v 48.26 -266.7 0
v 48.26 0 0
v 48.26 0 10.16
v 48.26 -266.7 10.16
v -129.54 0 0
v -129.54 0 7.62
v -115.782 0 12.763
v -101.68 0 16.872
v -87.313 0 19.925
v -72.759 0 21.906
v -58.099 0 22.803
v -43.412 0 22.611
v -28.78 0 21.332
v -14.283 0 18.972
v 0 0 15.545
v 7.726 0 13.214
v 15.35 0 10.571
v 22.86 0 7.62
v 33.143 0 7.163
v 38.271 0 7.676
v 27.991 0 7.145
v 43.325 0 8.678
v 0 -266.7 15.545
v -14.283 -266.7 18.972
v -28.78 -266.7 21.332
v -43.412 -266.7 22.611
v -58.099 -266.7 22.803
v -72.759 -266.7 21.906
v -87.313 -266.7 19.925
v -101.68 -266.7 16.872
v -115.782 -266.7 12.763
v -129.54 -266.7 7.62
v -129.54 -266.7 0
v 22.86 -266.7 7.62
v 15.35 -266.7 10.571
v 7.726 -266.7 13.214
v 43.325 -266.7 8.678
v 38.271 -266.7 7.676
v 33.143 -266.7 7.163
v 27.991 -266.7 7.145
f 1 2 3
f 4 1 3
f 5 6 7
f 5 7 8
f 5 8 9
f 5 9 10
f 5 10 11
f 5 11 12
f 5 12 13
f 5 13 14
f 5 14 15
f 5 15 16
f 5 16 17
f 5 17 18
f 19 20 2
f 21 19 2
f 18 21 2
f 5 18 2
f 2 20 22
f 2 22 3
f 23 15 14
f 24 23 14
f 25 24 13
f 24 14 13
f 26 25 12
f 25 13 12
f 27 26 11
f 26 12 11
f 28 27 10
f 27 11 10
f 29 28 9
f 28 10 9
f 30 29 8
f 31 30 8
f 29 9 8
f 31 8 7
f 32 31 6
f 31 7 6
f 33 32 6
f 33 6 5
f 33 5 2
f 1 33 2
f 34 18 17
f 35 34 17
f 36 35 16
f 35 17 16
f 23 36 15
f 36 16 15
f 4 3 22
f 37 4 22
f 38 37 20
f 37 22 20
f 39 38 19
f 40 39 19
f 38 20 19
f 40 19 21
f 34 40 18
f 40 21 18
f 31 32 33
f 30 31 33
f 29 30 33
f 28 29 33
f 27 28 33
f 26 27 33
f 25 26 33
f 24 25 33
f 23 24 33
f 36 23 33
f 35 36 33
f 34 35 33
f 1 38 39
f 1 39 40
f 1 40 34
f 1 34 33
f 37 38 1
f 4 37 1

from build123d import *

# Parameters (mm, degrees)
F1_DEPTH = 266.7
F2_DEPTH = 266.7


with BuildPart() as f1:
    # F0 (on Front) → F1 (new body)
    with BuildSketch(Plane.XZ):
        with BuildLine():
            Line((1.9e-05, 0), (1.9e-05, 15.544557))
            ThreePointArc((1.9e-05, 15.544557), (-65.437277, 22.490322), (-129.539981, 7.62))
            Line((-129.539981, 7.62), (-129.539981, 0))
            Line((-129.539981, 0), (1.9e-05, 0))
        make_face()
    extrude(amount=F1_DEPTH)

    # F0 (on Front) → F2 (join)
    with BuildSketch(Plane.XZ):
        with BuildLine():
            Line((1.9e-05, 0), (1.9e-05, 15.544557))
            ThreePointArc((1.9e-05, 15.544557), (-65.437277, 22.490322), (-129.539981, 7.62))
            Line((-129.539981, 7.62), (-129.539981, 0))
            Line((-129.539981, 0), (1.9e-05, 0))
        make_face()
        with BuildLine():
            ThreePointArc((48.260019, 10.16), (35.713201, 7.358175), (22.860019, 7.62))
            ThreePointArc((22.860019, 7.62), (11.551101, 11.931565), (1.9e-05, 15.544557))
            Line((1.9e-05, 15.544557), (1.9e-05, 0))
            Line((1.9e-05, 0), (48.260019, 0))
            Line((48.260019, 0), (48.260019, 10.16))
        make_face()
    extrude(amount=F2_DEPTH)


solid = f1.part
